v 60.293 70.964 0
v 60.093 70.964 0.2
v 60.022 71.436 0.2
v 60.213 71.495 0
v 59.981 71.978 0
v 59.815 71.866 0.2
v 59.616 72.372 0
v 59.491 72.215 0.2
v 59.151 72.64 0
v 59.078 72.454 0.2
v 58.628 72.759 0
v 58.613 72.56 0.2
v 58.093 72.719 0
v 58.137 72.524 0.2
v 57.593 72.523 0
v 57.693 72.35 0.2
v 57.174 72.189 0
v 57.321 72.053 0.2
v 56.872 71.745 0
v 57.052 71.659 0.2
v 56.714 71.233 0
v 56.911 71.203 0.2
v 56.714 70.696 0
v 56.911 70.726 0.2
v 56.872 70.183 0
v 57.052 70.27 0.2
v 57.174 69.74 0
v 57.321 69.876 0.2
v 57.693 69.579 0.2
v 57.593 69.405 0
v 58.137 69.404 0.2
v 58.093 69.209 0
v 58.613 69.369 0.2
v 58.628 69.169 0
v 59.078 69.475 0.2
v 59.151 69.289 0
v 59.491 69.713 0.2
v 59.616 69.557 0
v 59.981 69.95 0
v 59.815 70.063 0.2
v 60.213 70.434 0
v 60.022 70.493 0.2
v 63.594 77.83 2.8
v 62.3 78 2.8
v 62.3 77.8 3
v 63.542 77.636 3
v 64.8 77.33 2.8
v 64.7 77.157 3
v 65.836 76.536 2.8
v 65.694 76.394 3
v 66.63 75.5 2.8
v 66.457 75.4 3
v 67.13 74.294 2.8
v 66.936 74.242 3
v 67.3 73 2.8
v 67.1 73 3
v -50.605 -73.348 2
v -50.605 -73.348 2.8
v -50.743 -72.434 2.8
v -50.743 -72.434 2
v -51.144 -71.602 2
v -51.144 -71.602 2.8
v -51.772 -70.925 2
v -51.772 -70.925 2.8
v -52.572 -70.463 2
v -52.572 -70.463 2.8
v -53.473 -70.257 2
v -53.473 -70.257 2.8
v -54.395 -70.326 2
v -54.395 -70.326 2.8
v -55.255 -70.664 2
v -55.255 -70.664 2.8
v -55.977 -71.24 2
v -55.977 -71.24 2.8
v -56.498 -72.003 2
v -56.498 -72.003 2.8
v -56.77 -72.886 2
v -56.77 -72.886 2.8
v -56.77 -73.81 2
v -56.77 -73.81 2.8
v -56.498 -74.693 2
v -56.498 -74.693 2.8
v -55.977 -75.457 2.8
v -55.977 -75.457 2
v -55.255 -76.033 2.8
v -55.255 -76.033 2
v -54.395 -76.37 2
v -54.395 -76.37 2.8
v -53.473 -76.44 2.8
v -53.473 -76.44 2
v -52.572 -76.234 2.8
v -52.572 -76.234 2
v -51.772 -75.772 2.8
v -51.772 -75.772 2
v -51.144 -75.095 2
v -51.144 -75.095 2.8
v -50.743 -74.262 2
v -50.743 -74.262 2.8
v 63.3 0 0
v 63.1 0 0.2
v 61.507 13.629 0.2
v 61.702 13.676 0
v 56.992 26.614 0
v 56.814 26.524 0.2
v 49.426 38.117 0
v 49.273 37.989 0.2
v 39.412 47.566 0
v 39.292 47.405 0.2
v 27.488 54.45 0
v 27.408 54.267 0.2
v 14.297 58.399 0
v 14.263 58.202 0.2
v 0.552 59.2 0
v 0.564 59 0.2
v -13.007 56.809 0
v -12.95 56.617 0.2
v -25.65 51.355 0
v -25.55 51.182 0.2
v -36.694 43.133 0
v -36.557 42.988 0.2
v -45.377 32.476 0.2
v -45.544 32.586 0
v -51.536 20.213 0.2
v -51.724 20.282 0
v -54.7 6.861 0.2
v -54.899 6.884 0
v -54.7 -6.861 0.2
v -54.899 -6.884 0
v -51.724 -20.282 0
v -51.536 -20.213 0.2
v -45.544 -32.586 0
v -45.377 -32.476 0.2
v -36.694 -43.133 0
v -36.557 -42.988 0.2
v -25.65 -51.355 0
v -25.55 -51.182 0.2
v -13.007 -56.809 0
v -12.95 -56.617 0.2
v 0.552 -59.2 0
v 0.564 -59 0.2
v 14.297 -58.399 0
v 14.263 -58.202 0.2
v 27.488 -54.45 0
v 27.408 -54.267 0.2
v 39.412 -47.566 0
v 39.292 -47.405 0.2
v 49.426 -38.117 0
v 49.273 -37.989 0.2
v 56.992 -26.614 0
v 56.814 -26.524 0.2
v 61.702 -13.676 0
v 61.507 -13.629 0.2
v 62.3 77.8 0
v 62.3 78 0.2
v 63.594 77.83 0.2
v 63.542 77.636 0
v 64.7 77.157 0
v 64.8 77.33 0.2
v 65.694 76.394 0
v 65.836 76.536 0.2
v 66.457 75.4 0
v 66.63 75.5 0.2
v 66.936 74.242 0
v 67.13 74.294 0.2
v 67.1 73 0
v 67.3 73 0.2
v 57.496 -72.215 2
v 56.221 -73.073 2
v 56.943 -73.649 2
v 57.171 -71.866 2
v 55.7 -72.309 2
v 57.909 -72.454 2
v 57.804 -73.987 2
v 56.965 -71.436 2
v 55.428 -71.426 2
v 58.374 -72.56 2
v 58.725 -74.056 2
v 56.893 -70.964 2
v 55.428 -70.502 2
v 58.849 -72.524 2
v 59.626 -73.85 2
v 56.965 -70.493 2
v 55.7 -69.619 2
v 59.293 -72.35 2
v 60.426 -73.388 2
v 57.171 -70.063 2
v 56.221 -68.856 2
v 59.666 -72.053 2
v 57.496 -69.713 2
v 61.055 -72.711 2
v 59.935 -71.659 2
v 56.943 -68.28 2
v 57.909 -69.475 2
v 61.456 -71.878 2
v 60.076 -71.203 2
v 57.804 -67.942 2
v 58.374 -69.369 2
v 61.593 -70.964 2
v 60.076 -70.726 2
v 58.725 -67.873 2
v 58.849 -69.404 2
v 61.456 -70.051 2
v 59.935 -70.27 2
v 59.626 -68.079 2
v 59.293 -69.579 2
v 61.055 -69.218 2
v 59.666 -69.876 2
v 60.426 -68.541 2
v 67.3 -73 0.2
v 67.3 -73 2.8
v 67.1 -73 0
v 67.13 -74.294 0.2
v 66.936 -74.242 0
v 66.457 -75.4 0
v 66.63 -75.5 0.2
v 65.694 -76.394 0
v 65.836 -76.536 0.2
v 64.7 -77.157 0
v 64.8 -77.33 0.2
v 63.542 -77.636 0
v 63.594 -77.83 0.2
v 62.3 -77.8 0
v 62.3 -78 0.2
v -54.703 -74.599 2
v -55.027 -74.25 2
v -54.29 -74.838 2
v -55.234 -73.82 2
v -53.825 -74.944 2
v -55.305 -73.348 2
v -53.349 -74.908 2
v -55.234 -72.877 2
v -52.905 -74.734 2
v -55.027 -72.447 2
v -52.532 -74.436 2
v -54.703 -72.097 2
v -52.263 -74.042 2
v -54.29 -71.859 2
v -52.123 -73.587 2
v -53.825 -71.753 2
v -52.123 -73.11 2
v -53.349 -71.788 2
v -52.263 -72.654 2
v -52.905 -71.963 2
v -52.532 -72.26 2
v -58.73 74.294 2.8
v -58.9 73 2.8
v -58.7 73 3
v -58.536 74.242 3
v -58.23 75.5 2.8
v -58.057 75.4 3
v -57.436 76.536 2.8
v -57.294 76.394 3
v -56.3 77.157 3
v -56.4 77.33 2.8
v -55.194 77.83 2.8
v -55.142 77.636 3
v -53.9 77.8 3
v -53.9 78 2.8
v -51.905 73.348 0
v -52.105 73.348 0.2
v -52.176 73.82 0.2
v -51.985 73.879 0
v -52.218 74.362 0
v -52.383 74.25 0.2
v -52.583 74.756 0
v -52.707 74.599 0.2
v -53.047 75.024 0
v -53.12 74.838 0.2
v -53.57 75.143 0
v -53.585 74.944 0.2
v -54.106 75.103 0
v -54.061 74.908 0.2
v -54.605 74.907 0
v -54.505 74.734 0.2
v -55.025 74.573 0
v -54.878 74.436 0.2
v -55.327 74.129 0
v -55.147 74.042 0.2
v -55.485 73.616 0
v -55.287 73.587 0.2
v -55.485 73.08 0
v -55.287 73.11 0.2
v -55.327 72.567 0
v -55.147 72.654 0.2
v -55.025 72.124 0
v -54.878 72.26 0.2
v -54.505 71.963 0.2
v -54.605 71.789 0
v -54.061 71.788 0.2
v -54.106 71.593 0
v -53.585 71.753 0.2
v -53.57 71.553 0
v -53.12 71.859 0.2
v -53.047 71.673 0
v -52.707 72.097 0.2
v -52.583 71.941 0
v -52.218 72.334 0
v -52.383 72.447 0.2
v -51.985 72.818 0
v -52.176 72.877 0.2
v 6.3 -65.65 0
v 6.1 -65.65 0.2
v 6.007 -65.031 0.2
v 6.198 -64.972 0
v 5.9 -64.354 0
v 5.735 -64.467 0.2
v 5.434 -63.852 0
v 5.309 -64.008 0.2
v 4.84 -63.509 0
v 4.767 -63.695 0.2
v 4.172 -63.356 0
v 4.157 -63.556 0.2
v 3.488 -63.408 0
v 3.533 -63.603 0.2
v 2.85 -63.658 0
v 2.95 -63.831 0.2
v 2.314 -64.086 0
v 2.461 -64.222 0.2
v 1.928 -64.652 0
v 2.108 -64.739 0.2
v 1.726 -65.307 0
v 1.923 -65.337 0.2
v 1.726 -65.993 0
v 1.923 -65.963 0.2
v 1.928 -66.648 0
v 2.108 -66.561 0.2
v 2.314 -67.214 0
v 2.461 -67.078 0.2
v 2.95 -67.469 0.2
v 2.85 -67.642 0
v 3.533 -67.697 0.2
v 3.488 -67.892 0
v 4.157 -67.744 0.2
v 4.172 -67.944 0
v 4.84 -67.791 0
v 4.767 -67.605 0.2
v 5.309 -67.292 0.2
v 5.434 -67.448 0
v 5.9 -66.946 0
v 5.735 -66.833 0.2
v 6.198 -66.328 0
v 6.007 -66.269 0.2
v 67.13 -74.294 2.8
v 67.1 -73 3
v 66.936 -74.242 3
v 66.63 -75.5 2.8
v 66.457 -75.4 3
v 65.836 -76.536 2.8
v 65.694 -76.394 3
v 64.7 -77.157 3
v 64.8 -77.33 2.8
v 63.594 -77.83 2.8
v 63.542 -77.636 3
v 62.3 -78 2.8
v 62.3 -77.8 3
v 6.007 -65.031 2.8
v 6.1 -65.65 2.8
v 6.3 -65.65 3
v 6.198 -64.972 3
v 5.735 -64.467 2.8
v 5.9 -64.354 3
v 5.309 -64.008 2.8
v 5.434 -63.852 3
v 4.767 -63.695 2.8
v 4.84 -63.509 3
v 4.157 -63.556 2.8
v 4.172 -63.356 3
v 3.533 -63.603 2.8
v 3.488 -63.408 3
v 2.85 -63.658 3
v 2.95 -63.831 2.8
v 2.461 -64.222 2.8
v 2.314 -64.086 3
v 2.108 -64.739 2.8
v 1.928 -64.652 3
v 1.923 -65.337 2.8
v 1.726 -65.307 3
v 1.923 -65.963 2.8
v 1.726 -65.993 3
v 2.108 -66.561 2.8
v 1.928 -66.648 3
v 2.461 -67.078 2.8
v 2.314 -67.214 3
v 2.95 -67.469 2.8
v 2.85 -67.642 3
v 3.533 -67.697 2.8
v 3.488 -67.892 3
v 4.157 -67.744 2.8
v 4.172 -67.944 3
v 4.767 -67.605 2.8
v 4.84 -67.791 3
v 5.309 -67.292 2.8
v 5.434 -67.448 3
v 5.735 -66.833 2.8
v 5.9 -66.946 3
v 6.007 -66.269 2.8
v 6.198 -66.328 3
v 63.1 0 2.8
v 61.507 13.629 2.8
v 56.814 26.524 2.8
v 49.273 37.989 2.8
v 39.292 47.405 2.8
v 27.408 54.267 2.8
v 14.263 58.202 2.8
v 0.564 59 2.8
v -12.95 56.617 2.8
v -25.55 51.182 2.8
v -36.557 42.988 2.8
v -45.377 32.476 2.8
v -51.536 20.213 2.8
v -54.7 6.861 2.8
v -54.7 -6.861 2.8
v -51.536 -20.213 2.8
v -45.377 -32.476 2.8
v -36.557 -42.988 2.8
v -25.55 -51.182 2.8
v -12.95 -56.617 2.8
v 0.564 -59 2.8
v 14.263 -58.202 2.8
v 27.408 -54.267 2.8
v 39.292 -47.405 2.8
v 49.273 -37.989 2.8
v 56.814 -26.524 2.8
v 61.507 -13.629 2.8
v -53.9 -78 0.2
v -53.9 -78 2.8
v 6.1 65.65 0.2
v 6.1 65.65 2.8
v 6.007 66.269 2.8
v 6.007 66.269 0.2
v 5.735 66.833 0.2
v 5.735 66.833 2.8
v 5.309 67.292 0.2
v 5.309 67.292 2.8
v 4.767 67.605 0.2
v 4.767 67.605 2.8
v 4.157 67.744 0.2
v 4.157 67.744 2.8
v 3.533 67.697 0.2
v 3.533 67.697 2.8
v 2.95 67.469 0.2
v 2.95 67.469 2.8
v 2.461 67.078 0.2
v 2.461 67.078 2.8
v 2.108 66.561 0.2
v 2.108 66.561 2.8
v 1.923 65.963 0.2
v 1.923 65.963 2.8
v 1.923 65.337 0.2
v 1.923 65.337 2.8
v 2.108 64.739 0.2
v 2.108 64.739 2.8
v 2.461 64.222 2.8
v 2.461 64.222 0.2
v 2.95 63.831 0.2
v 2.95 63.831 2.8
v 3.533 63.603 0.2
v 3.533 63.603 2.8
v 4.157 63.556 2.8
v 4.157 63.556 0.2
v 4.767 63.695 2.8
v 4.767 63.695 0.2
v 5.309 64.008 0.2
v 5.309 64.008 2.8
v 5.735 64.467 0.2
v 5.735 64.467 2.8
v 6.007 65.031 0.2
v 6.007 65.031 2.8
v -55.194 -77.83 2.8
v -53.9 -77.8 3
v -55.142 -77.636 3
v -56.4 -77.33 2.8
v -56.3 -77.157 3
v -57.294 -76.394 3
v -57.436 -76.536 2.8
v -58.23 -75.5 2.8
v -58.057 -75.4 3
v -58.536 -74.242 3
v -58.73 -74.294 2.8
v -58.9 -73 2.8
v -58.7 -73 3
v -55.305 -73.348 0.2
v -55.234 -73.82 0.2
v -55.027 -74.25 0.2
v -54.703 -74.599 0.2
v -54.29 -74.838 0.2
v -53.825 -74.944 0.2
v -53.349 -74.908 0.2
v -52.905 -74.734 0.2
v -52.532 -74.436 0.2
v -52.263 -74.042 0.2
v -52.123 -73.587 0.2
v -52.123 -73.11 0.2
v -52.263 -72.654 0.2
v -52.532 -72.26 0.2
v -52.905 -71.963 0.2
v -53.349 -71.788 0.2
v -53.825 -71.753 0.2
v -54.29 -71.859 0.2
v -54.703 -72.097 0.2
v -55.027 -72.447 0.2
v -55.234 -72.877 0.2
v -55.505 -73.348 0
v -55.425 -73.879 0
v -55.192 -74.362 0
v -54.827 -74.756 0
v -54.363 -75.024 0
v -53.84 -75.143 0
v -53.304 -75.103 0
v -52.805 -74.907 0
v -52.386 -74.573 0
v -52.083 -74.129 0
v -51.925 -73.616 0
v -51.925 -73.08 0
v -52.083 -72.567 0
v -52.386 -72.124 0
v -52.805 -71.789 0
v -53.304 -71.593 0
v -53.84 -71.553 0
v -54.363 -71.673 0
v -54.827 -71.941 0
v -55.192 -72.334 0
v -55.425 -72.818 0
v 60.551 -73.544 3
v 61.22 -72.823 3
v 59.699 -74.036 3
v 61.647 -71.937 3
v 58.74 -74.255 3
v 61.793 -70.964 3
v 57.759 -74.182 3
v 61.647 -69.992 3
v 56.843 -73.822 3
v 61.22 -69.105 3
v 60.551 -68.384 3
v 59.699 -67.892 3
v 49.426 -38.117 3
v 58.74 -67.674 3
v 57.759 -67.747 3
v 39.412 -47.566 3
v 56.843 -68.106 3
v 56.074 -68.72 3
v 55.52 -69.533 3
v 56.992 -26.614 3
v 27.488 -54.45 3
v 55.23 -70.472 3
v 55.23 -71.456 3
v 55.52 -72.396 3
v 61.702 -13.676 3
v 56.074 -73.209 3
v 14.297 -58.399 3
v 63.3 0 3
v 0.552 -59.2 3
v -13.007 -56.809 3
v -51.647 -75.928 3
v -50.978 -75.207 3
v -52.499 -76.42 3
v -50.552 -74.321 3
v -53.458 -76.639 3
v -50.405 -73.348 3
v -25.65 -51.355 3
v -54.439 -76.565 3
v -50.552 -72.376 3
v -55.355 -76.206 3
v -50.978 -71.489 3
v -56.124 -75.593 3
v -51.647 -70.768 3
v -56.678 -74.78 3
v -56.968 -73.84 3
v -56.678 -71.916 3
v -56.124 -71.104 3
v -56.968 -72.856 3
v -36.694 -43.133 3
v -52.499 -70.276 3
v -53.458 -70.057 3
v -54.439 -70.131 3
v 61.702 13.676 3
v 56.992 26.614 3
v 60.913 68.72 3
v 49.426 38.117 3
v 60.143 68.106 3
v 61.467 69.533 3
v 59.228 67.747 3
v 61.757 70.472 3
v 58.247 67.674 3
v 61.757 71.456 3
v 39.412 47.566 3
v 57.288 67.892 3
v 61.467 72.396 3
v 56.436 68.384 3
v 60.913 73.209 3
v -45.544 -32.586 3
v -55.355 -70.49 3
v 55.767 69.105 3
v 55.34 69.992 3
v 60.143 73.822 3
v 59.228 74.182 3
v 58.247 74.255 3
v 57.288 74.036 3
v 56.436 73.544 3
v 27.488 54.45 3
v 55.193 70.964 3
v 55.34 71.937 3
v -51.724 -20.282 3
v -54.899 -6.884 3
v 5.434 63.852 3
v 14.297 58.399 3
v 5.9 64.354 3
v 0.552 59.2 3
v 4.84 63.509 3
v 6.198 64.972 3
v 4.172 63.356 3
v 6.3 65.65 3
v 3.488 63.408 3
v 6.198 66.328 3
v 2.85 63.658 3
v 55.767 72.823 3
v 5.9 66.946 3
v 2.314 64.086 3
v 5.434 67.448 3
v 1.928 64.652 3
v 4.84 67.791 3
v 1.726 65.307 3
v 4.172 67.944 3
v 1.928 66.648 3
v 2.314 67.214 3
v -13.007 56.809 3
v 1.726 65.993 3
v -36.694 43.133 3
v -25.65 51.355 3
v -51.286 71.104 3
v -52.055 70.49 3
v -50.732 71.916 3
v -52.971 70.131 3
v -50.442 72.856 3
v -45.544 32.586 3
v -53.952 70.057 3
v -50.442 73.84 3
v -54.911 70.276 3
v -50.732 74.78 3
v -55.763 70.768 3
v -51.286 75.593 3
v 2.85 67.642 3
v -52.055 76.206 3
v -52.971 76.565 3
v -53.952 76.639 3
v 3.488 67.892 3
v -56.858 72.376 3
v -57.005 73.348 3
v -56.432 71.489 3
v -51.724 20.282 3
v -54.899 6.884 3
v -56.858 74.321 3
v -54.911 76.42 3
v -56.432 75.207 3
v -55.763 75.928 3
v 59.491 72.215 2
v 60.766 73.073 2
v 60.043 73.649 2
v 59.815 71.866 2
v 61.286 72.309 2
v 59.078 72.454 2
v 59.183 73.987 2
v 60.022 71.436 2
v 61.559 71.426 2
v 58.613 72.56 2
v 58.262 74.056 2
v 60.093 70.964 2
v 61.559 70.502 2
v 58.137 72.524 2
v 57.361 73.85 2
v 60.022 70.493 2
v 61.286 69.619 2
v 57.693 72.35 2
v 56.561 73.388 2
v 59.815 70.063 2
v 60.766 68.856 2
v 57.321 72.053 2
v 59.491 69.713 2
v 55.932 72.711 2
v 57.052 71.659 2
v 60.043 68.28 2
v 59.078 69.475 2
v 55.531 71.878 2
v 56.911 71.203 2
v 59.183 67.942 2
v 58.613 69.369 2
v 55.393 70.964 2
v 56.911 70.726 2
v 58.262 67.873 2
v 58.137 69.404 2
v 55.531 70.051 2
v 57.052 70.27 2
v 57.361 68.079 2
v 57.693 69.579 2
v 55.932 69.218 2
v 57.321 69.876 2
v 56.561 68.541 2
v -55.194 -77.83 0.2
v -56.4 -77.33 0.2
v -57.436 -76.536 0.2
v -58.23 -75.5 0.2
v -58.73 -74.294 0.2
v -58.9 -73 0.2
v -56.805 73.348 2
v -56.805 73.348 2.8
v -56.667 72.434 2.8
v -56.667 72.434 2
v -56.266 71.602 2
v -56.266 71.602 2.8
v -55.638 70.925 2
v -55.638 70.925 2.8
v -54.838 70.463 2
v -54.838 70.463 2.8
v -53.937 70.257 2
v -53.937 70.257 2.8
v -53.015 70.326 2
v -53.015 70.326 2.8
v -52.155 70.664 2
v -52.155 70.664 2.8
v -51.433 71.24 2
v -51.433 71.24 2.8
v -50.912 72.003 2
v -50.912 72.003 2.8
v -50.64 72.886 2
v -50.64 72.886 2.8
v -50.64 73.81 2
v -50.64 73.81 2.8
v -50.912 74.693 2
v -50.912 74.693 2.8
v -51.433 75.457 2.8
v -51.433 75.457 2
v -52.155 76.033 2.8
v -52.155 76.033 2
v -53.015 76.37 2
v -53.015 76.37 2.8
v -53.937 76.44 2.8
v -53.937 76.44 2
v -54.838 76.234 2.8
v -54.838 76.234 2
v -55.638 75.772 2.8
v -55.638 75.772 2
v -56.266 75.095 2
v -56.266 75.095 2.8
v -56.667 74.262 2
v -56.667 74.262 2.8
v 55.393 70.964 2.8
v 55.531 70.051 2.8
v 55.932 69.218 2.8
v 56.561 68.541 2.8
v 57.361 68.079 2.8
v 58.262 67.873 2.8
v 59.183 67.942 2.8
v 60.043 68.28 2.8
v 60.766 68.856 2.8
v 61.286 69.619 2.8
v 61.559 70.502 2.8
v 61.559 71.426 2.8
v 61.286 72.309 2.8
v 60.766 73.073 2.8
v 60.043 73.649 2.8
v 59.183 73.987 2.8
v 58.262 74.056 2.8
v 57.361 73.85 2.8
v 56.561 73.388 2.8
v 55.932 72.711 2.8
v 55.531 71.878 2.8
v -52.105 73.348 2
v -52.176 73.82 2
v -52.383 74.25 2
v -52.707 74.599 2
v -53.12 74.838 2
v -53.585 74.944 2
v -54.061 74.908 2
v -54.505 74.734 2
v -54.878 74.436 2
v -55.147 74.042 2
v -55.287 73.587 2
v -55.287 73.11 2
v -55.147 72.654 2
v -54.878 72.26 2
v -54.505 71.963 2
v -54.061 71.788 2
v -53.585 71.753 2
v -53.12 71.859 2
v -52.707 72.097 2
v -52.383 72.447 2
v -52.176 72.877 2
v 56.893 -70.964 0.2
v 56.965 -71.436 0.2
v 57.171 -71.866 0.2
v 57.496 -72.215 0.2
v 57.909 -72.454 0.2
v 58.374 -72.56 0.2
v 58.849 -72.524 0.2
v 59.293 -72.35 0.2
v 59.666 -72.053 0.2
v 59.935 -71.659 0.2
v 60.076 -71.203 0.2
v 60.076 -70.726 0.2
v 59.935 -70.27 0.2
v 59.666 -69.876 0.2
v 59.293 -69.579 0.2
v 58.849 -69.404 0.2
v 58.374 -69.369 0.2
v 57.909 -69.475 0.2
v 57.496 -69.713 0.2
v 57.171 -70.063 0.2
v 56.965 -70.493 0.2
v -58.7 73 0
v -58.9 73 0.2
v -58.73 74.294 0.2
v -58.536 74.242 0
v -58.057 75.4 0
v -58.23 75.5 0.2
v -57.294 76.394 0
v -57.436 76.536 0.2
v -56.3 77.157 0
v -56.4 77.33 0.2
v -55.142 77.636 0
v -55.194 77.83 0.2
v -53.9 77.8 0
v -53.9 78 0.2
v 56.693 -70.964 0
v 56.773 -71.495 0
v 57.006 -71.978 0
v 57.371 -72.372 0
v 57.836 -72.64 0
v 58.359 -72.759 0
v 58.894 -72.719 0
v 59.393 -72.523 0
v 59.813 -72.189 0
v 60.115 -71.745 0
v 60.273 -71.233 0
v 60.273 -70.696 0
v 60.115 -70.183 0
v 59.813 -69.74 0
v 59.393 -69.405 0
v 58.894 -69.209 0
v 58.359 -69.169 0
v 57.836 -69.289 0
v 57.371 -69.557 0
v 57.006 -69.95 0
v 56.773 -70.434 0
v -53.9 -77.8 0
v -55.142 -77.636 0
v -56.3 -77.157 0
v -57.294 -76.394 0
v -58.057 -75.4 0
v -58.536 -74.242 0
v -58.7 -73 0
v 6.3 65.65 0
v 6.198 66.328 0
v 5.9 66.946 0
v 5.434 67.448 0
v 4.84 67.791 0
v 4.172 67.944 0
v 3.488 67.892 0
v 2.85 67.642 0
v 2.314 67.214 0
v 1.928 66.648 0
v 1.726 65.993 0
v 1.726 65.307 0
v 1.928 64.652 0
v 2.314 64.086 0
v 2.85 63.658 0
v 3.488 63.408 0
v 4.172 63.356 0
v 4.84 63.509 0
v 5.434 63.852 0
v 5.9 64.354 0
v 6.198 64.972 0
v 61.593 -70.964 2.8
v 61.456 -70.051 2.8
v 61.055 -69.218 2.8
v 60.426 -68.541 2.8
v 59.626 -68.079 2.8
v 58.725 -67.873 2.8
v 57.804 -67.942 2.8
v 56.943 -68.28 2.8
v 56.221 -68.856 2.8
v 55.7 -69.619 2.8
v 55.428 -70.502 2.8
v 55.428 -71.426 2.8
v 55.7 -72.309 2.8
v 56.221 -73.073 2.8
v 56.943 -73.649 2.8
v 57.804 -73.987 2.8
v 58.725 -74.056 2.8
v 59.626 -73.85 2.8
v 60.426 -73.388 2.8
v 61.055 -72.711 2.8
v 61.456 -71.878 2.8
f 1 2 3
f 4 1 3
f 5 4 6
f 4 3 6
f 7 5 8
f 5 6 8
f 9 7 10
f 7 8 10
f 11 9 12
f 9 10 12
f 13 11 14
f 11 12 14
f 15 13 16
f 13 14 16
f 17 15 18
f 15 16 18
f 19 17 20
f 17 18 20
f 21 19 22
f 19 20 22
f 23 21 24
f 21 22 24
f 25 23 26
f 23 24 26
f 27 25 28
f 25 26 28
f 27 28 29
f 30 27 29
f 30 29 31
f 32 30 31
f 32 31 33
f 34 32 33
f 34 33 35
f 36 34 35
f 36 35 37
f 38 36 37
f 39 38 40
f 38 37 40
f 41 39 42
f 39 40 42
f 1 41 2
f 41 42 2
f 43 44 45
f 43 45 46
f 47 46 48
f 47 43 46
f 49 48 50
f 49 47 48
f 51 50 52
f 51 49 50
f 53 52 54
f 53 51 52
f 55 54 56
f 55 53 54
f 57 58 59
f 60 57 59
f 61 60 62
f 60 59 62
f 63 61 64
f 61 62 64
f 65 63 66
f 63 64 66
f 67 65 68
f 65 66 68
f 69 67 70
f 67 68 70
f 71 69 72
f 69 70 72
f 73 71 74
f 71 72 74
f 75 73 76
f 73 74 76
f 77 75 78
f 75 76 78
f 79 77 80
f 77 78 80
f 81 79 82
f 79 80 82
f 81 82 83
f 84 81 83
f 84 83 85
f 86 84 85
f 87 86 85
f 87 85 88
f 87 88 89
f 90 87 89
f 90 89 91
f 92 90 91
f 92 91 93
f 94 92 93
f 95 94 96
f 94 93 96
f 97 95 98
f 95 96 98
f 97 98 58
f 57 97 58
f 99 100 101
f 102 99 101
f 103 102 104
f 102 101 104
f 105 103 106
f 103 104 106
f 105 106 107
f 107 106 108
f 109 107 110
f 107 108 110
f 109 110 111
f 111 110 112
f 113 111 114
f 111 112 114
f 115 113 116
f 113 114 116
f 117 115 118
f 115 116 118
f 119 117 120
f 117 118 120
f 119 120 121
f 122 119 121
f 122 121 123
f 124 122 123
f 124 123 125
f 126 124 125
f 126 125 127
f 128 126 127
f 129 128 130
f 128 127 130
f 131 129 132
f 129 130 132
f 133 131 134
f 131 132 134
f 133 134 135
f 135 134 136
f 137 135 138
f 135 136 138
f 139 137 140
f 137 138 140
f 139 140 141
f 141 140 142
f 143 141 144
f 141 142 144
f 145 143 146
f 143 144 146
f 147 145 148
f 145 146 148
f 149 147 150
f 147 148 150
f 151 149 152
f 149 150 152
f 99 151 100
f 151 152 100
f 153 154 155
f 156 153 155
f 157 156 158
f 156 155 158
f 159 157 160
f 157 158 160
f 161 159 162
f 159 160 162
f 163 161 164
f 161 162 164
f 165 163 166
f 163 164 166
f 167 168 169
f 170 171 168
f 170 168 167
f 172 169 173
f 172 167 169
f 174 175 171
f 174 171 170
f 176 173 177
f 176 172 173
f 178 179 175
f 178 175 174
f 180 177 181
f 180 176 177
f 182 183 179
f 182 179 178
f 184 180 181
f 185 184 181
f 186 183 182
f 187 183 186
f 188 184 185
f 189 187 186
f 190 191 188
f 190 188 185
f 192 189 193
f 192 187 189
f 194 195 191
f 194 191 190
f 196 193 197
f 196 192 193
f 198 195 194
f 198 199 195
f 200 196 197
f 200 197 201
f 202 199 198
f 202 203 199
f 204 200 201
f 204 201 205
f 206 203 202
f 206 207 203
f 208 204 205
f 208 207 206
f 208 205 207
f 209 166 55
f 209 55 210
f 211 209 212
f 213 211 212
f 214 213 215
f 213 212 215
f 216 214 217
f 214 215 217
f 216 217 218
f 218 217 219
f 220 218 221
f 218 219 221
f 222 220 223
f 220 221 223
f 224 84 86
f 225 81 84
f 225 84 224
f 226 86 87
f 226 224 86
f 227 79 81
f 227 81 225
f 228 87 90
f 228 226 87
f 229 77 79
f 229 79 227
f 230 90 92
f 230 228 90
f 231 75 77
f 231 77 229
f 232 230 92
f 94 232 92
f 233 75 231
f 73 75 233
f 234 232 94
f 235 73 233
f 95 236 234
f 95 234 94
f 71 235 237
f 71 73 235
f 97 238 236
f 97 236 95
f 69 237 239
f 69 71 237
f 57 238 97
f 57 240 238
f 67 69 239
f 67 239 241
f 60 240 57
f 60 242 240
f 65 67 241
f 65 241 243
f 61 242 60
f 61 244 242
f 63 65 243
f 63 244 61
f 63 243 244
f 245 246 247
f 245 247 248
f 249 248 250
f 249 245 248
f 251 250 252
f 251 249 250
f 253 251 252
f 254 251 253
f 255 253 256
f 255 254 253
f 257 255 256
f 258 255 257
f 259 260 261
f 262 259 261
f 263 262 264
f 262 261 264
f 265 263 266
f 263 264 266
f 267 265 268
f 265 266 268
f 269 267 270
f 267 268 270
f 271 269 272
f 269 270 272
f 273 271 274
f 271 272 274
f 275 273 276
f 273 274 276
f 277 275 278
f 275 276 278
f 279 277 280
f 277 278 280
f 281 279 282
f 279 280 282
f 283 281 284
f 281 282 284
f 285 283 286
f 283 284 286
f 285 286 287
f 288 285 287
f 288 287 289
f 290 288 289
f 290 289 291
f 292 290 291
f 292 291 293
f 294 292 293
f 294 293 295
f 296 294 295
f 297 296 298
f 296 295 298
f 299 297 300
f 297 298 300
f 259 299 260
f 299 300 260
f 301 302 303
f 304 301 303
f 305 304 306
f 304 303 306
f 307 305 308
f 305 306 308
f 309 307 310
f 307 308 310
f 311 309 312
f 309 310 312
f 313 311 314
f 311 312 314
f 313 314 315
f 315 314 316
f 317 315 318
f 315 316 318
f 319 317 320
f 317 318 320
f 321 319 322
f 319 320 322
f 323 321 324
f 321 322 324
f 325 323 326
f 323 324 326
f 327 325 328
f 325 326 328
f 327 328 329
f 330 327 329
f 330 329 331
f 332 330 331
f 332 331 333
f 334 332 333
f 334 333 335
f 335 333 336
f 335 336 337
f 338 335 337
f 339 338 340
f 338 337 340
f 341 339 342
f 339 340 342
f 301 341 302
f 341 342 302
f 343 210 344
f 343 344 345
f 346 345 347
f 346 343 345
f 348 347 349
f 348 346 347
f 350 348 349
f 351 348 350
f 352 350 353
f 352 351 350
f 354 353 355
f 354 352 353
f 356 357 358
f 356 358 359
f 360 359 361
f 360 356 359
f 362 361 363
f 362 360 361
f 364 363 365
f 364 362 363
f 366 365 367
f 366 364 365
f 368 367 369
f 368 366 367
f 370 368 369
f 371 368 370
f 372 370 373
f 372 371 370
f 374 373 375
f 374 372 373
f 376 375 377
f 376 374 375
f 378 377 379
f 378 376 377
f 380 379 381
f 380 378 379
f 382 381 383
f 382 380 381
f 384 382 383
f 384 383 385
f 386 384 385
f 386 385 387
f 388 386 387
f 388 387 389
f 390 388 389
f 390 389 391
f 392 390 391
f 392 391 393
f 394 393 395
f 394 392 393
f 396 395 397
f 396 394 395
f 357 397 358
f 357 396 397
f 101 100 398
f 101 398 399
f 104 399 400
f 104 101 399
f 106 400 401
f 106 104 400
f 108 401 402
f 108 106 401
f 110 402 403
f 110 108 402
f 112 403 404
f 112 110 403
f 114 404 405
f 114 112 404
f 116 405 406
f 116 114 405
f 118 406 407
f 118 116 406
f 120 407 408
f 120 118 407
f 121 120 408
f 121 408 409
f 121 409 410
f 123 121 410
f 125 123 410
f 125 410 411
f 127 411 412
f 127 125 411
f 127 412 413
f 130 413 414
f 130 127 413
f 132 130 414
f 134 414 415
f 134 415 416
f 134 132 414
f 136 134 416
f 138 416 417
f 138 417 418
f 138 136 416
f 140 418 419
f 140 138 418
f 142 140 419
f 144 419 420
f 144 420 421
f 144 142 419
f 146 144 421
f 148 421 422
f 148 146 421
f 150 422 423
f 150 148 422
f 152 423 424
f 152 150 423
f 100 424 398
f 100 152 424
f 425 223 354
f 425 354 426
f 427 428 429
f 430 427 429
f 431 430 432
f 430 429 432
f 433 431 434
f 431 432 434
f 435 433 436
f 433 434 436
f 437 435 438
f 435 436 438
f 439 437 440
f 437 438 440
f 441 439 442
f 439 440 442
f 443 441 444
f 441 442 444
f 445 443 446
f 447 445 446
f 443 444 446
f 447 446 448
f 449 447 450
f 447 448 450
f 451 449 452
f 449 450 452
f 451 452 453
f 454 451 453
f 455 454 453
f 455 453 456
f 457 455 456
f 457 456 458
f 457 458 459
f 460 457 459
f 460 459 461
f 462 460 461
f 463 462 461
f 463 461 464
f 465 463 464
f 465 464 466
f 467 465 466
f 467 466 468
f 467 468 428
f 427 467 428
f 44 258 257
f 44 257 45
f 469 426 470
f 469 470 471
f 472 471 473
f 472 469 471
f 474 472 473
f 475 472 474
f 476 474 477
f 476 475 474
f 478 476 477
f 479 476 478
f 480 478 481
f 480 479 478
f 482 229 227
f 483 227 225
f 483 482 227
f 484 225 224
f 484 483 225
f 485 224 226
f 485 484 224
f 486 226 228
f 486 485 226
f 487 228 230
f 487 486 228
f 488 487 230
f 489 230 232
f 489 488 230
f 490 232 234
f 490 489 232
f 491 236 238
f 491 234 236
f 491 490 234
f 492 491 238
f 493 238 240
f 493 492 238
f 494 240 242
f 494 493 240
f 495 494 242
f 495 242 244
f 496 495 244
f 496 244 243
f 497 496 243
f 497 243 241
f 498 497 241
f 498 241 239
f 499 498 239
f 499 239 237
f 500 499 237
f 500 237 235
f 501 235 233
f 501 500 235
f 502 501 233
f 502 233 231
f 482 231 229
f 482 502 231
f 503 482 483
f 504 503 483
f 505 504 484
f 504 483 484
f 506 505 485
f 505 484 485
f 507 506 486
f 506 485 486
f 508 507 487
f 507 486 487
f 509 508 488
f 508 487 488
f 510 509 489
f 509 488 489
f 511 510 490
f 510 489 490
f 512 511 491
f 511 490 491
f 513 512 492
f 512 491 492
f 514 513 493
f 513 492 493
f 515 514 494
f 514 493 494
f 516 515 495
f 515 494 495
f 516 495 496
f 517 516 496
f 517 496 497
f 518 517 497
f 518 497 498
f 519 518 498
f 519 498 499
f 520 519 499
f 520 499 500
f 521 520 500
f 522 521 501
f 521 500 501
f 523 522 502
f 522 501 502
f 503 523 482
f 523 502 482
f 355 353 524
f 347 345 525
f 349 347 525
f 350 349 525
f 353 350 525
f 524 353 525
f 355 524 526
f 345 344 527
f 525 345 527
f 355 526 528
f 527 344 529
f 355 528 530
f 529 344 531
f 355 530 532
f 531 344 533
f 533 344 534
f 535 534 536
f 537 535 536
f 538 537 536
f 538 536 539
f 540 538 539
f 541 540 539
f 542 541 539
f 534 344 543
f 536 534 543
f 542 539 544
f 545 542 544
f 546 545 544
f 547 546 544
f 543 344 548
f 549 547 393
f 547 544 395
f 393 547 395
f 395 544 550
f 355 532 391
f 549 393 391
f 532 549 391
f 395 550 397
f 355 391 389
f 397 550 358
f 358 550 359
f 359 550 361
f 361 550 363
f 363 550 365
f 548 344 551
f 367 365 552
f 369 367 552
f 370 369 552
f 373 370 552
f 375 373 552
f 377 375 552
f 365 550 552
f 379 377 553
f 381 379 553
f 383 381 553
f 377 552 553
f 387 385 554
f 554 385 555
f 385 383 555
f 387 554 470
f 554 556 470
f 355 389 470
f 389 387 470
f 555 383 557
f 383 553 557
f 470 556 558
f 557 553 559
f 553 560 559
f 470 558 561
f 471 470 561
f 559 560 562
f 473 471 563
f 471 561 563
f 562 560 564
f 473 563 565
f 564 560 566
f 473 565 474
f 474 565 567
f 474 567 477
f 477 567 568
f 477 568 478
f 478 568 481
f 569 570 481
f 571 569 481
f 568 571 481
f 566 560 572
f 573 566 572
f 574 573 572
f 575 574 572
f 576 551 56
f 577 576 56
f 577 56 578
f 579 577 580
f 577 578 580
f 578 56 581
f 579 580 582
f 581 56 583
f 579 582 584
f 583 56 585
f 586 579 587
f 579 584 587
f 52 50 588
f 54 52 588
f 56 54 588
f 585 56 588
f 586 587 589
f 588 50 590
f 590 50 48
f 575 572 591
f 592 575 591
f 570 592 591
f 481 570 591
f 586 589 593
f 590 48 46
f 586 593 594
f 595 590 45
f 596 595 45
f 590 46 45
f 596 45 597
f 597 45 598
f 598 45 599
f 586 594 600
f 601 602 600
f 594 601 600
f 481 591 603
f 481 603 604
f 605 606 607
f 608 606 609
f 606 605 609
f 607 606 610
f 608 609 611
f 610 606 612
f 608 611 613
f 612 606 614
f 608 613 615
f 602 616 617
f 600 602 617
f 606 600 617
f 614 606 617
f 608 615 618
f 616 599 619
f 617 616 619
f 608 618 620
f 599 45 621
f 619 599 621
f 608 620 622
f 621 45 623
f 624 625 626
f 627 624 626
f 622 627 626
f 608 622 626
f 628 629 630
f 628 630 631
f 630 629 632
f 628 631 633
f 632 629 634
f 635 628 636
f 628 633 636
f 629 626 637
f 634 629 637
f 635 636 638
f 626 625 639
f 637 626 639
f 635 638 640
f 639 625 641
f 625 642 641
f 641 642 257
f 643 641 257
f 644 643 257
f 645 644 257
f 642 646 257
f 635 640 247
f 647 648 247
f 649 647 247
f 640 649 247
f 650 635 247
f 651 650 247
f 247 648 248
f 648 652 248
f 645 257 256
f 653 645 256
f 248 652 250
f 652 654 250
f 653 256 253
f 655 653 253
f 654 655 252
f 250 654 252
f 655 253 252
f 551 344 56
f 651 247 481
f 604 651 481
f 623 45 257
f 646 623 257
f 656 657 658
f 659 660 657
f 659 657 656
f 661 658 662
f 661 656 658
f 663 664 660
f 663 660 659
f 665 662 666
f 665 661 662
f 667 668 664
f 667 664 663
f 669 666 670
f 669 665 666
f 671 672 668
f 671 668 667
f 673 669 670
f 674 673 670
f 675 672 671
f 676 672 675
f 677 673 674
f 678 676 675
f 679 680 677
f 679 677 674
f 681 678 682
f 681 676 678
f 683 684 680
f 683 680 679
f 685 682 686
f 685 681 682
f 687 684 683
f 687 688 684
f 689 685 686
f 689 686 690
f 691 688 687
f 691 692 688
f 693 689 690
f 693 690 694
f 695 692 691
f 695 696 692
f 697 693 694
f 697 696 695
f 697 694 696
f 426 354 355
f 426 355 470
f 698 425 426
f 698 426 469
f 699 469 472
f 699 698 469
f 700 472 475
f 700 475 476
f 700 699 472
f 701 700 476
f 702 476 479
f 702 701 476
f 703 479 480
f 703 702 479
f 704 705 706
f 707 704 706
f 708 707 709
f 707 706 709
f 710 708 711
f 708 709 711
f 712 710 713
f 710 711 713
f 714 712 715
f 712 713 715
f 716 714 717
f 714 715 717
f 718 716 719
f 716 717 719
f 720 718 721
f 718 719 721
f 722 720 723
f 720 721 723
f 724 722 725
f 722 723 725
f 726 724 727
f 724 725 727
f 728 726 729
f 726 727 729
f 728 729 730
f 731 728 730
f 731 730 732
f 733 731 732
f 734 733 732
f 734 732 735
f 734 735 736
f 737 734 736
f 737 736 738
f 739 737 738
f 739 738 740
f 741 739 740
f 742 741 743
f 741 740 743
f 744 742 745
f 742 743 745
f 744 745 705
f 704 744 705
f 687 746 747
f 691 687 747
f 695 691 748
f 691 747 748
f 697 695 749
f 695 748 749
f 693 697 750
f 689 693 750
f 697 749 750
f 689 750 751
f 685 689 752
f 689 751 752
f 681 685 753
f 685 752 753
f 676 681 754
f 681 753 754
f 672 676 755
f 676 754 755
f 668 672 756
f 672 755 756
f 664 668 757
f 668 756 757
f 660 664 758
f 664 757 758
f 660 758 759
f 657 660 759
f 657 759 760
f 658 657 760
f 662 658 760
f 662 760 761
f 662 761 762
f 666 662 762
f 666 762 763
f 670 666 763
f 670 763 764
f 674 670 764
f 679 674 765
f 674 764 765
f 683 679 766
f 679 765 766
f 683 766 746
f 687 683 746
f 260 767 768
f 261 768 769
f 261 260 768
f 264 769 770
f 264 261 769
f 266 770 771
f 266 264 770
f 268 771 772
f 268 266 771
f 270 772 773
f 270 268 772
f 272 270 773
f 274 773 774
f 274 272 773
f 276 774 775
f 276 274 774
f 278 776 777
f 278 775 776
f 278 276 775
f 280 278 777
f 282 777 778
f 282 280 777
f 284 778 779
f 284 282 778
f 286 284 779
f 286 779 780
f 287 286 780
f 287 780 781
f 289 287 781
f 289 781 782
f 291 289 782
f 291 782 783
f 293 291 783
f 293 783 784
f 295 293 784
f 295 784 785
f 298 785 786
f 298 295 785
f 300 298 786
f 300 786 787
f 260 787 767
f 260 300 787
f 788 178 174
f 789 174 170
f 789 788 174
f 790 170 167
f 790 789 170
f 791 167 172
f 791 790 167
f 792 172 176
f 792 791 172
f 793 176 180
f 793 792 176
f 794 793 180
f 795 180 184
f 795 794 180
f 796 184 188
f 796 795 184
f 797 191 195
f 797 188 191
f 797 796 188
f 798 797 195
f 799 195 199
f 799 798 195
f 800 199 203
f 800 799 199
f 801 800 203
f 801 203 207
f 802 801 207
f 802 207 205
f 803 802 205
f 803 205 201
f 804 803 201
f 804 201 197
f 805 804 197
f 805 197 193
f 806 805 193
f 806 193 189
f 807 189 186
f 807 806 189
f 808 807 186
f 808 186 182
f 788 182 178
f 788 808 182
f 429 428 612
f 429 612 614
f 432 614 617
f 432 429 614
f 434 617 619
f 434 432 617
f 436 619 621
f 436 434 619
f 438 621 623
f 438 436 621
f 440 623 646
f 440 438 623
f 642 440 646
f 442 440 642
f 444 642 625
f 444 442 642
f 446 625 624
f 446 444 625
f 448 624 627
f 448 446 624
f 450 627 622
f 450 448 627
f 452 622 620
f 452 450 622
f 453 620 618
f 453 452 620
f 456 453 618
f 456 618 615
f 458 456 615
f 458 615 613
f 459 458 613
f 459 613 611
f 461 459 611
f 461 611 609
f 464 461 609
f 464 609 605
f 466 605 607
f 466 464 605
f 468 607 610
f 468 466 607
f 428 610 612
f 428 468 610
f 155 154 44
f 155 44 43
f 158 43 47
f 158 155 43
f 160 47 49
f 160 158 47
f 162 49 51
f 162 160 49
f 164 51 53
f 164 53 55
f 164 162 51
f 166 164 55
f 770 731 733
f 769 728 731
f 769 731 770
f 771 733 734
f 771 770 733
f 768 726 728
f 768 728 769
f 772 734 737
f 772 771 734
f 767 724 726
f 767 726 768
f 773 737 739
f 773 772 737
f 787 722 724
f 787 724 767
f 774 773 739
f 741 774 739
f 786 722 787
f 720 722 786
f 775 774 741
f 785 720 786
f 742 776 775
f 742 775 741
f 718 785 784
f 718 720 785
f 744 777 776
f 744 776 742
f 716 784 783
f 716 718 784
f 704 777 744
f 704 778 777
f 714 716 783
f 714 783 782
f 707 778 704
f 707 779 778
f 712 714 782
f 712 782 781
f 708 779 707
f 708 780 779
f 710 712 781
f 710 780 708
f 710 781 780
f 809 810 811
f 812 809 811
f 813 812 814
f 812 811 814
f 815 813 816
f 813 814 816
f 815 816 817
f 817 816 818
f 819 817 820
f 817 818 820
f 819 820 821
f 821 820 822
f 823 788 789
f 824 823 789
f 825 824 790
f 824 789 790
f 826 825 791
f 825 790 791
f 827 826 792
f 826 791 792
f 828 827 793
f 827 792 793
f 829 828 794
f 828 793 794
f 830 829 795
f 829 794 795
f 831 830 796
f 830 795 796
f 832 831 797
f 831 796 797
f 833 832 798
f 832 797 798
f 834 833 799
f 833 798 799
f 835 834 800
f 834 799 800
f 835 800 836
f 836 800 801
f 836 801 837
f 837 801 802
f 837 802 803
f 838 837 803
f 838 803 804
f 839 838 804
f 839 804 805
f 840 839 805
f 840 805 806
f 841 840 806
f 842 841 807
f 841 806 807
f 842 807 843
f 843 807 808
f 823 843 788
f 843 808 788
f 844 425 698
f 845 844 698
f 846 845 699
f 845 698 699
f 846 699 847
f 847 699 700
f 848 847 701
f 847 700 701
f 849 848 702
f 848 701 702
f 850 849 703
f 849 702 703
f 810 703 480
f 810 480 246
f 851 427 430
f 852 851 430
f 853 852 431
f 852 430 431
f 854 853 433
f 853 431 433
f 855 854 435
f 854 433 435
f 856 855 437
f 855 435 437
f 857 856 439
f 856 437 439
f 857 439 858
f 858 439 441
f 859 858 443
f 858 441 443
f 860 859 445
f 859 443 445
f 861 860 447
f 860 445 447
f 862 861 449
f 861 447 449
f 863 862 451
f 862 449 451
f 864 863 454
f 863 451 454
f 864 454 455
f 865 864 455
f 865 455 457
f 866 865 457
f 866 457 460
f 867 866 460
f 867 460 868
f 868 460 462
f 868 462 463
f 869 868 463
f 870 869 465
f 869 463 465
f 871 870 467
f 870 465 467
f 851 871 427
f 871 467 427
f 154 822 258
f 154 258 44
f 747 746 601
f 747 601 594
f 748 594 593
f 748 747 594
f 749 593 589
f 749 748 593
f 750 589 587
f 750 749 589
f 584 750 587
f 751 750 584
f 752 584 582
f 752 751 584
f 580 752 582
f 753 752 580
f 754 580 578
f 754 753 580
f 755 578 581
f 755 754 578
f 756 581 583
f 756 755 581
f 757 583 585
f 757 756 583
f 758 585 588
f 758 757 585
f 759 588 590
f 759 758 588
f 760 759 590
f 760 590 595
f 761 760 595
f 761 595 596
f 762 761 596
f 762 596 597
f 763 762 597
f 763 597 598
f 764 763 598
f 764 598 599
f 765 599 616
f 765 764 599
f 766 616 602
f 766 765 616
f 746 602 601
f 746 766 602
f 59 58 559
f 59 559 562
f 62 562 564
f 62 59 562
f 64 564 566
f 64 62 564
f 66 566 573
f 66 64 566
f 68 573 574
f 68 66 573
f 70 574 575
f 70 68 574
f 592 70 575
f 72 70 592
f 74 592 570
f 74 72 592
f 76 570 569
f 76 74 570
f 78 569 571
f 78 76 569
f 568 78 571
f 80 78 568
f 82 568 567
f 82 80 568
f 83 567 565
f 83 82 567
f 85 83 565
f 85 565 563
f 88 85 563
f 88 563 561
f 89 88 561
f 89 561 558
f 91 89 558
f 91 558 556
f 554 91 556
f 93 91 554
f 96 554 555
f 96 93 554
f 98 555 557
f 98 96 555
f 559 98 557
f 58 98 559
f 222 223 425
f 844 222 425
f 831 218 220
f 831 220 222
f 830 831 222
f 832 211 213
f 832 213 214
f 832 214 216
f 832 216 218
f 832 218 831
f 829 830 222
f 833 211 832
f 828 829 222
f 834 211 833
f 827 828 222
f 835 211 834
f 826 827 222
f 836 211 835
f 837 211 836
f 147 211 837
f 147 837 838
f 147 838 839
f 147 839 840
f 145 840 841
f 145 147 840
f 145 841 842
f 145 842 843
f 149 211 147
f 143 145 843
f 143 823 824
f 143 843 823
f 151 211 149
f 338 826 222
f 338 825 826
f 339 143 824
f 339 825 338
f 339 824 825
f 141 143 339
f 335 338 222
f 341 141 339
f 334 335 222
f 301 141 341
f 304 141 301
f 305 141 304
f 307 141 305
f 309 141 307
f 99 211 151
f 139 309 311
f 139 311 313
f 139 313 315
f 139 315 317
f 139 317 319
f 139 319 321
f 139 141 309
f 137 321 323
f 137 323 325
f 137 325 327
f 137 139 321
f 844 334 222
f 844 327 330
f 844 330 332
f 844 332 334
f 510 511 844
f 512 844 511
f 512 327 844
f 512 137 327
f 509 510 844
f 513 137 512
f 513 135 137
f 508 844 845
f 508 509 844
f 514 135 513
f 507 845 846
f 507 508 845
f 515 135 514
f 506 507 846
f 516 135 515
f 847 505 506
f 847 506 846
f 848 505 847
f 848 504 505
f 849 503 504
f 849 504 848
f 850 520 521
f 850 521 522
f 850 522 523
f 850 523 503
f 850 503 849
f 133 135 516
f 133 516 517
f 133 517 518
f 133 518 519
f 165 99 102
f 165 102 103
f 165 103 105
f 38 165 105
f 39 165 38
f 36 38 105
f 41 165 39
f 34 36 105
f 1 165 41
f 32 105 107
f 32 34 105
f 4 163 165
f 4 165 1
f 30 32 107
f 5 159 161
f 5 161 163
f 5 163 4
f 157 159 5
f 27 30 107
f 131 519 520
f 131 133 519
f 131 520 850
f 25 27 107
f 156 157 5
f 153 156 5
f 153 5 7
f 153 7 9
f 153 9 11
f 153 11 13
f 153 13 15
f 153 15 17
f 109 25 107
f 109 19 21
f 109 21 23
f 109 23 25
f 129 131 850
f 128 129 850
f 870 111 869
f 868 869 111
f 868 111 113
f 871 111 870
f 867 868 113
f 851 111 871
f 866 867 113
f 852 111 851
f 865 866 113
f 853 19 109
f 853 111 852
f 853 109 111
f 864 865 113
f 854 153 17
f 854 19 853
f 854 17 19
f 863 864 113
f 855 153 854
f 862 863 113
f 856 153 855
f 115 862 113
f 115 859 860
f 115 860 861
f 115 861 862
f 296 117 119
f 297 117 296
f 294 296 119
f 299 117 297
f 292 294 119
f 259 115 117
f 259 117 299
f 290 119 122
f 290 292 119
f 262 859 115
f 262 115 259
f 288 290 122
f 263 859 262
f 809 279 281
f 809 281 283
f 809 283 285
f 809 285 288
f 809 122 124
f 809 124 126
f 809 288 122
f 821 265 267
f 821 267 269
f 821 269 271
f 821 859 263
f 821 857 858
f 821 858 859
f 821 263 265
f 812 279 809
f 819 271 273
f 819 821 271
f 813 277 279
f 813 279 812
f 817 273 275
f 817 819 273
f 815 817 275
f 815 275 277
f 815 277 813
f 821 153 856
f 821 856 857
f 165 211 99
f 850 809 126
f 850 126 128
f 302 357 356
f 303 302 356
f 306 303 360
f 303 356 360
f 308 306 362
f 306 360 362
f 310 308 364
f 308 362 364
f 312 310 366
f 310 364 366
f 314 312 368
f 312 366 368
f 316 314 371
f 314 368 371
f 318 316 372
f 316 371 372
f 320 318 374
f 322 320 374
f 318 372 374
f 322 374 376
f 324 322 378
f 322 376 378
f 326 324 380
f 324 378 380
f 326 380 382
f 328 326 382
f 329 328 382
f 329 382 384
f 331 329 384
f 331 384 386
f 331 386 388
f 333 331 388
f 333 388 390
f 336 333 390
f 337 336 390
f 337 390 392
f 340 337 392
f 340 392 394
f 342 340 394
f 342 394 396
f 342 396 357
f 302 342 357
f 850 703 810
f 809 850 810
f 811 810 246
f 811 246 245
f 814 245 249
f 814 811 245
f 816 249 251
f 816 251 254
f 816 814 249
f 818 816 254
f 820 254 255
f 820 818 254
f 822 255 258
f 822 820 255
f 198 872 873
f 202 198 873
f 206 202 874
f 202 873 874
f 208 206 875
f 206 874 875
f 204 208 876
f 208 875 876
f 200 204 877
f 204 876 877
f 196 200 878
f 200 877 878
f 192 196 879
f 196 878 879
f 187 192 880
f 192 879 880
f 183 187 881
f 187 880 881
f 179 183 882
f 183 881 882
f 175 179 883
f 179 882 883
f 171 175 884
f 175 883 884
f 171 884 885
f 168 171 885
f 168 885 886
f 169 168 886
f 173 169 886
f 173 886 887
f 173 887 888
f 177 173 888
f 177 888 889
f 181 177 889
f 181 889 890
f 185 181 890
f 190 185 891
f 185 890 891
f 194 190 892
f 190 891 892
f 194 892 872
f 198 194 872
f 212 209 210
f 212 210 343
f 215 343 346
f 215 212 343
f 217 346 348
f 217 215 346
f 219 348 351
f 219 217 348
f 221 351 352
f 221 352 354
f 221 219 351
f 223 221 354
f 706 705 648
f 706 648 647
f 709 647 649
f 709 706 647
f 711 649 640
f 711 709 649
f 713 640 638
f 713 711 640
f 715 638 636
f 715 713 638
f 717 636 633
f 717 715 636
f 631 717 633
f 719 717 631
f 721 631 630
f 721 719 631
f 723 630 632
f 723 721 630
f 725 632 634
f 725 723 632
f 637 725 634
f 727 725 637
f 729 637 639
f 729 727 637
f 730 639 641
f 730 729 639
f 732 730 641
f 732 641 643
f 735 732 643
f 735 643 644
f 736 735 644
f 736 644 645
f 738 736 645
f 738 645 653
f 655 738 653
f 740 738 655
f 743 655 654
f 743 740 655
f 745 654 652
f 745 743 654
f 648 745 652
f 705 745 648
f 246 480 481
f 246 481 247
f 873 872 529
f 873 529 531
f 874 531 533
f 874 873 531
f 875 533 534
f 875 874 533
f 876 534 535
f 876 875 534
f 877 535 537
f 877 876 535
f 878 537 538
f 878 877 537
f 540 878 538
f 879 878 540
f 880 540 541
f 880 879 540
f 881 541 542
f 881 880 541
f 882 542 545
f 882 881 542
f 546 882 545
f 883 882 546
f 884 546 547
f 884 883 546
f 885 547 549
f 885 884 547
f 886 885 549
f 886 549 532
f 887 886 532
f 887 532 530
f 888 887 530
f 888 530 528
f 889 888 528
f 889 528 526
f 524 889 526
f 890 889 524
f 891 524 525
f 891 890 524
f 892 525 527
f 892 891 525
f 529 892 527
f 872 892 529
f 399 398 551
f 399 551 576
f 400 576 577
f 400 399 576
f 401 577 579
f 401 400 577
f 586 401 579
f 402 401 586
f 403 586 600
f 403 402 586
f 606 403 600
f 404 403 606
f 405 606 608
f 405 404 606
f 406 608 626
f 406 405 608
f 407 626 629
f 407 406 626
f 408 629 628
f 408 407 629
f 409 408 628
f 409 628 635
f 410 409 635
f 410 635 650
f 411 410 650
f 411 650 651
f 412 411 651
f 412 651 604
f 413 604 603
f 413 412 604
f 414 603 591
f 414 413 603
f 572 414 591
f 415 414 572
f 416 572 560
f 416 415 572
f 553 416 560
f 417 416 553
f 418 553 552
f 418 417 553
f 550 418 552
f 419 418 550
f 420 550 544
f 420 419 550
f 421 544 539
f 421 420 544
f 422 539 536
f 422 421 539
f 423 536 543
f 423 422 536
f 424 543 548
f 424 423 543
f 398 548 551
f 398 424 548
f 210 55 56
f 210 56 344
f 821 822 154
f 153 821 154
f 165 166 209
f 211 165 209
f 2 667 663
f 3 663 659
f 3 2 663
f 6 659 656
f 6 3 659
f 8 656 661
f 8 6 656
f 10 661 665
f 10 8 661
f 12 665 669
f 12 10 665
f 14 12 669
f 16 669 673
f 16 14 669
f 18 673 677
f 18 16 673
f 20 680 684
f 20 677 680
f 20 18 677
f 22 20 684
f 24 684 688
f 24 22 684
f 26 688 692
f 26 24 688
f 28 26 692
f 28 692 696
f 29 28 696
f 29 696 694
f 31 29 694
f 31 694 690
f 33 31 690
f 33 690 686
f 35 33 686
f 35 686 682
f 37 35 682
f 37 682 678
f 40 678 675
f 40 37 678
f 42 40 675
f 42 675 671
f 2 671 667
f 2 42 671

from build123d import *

# Parameters (mm, degrees)
SKETCH_1_R          = 59.1
SKETCH_1_R_2        = 1.6
EXTRUDE_1_DEPTH     = 3
SKETCH_2_R          = 2.1
CUT_EXTRUDE_1_DEPTH = 104.064494371
SKETCH_3_R          = 3.1
CUT_EXTRUDE_2_DEPTH = 1
CHAMFER_1_SIZE      = 0.2


with BuildPart() as part:
    # 草图1 → 凸台-拉伸1 (new body)
    with BuildSketch(Plane.XY):
        with BuildLine():
            Line((62.3, -78), (-53.9, -78))
            ThreePointArc((-53.9, -78), (-57.435533906, -76.535533906), (-58.9, -73))
            Line((-58.9, -73), (-58.9, 73))
            ThreePointArc((-58.9, 73), (-57.435533906, 76.535533906), (-53.9, 78))
            Line((-53.9, 78), (62.3, 78))
            ThreePointArc((62.3, 78), (65.835533906, 76.535533906), (67.3, 73))
            Line((67.3, 73), (67.3, -73))
            ThreePointArc((67.3, -73), (65.835533906, -76.535533906), (62.3, -78))
        make_face()
        with Locations((4, 0)):
            Circle(SKETCH_1_R, mode=Mode.SUBTRACT)
        with Locations((58.493442579, 70.964337058)):
            Circle(SKETCH_1_R_2, mode=Mode.SUBTRACT)
        with Locations((-53.705008218, 73.348219362)):
            Circle(SKETCH_1_R_2, mode=Mode.SUBTRACT)
        with Locations(Location((58.493442579, -70.964337058, 0), (0, 0, 180))):
            Circle(SKETCH_1_R_2, mode=Mode.SUBTRACT)
        with Locations(Location((-53.705008218, -73.348219362, 0), (0, 0, 180))):
            Circle(SKETCH_1_R_2, mode=Mode.SUBTRACT)
    extrude(amount=EXTRUDE_1_DEPTH)

    # 草图2 → 切除-拉伸1 (cut, through all)
    with BuildSketch(Plane.XY.offset(3)):
        with Locations((4, -65.65)):
            Circle(SKETCH_2_R)
        with Locations((4, 65.65)):
            Circle(SKETCH_2_R)
    extrude(amount=-CUT_EXTRUDE_1_DEPTH, mode=Mode.SUBTRACT)

    # 草图3 → 切除-拉伸2 (cut)
    with BuildSketch(Plane.XY.offset(3)):
        with Locations((58.493442579, -70.964337058)):
            Circle(SKETCH_3_R)
        with Locations((-53.705008218, -73.348219362)):
            Circle(SKETCH_3_R)
        with Locations(Location((-53.705008218, 73.348219362, 0), (0, 0, 180))):
            Circle(SKETCH_3_R)
        with Locations(Location((58.493442579, 70.964337058, 0), (0, 0, 180))):
            Circle(SKETCH_3_R)
    extrude(amount=-CUT_EXTRUDE_2_DEPTH, mode=Mode.SUBTRACT)

    # 倒角1
    chamfer_1_edges = [part.edges().sort_by_distance(p)[0] for p in [
        (4.2, 78, 0),
        (65.835533906, 76.535533906, 0),
        (67.3, 0, 0),
        (65.835533906, -76.535533906, 0),
        (65.835533906, 76.535533906, 3),
        (4.2, 78, 3),
        (-57.435533906, 76.535533906, 3),
        (-55.1, 0, 0),
        (-55.1, 0, 3),
        (-58.9, 0, 3),
        (56.893442579, 70.964337058, 0),
        (-57.435533906, -76.535533906, 3),
        (60.093442579, -70.964337058, 0),
        (4.2, -78, 3),
        (-55.305008218, 73.348219362, 0),
        (-52.105008218, -73.348219362, 0),
        (65.835533906, -76.535533906, 3),
        (1.9, -65.65, 0),
        (1.9, -65.65, 3),
        (1.9, 65.65, 0),
        (1.9, 65.65, 3),
        (61.593442579, 70.964337058, 3),
        (-50.605008218, 73.348219362, 3),
        (-56.805008218, -73.348219362, 3),
        (55.393442579, -70.964337058, 3),
        (4.2, -78, 0),
        (67.3, 0, 3),
        (-57.435533906, -76.535533906, 0),
        (-58.9, 0, 0),
        (-57.435533906, 76.535533906, 0),
    ]]
    chamfer(chamfer_1_edges, length=CHAMFER_1_SIZE)


solid = part.part
